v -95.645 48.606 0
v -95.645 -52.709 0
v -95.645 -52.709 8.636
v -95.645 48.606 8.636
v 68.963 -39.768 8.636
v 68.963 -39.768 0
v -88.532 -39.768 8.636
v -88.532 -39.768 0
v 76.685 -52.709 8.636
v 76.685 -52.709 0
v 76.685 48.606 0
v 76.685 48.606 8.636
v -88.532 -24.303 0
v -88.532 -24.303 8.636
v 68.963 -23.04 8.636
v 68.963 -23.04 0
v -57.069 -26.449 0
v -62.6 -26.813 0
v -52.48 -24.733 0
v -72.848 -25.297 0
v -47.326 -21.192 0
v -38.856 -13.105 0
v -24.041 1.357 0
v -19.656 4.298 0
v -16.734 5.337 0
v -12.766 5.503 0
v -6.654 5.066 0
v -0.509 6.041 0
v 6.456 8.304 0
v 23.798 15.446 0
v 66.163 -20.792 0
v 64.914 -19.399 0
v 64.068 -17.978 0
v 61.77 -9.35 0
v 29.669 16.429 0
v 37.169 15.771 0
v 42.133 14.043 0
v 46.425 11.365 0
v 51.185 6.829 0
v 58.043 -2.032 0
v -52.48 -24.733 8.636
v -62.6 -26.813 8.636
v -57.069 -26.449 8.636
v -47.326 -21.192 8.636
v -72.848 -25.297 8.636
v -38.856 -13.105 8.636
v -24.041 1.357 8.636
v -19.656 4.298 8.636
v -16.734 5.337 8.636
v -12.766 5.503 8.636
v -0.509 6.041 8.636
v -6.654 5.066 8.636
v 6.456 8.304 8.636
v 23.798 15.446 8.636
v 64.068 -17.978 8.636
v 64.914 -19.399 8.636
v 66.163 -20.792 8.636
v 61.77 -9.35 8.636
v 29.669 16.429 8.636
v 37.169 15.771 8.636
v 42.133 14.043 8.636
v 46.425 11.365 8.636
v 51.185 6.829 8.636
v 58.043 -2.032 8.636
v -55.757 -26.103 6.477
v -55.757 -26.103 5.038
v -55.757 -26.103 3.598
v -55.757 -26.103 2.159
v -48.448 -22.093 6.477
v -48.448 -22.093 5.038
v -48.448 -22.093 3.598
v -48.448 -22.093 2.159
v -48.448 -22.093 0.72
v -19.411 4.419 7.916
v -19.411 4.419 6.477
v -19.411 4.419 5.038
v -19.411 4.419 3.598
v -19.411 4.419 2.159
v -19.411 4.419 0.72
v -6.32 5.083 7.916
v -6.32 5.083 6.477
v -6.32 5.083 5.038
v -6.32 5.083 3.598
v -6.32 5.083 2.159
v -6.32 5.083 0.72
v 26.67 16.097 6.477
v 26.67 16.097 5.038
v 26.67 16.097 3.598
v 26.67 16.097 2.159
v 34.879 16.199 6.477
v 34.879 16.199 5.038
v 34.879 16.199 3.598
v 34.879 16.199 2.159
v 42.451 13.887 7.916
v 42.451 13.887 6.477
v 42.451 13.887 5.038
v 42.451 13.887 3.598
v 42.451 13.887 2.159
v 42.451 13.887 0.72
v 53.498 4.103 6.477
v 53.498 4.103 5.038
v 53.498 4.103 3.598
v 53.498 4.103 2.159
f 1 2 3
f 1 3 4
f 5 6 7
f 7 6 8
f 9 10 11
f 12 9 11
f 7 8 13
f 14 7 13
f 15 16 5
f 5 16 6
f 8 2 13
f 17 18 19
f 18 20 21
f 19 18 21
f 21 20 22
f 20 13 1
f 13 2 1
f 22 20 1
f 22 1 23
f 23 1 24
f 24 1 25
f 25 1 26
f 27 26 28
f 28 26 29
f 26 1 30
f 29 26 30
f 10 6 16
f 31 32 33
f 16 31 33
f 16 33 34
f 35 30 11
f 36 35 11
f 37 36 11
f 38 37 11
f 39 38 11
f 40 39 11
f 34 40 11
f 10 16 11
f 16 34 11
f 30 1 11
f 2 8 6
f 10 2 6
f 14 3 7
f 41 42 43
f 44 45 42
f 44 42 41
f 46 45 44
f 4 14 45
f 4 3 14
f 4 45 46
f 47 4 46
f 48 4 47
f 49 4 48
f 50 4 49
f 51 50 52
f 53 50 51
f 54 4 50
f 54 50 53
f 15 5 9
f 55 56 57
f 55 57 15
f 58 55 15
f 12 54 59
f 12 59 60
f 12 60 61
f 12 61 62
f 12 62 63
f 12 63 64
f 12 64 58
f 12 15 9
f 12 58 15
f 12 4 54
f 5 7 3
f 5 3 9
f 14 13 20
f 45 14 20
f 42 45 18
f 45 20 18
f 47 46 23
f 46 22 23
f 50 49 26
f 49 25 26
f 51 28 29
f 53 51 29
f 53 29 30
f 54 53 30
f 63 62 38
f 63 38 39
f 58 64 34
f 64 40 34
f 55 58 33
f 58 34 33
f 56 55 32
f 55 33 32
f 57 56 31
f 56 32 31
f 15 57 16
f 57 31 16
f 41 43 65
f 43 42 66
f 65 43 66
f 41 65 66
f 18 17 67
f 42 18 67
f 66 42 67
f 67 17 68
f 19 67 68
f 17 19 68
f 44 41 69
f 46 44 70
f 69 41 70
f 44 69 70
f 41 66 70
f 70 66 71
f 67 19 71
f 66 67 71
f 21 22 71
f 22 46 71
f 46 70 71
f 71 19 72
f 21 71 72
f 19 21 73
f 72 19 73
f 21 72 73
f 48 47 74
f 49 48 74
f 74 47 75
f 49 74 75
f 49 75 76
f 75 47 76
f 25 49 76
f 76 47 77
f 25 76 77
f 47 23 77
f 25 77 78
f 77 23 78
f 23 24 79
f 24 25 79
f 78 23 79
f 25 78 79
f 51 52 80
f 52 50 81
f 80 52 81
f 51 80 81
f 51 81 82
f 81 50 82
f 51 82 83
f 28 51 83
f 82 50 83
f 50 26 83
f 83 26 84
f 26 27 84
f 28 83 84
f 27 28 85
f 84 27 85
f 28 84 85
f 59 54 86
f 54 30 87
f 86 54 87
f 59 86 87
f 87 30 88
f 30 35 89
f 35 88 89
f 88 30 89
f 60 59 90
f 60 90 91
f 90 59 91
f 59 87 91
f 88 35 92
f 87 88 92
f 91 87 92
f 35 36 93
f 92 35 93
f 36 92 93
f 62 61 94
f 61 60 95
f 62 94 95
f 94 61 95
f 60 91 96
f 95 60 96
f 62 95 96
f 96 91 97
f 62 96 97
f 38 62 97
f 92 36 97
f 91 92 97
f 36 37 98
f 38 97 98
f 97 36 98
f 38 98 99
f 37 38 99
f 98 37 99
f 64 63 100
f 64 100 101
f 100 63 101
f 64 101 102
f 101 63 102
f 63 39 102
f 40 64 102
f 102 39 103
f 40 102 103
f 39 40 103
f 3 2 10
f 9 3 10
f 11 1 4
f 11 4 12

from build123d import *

# Parameters (mm, degrees)
F0_W     = 172.3292320967
F0_H     = 101.3144366443
F1_DEPTH = 8.636


with BuildPart() as f1:
    # F0 (on Top) → F1 (new body)
    with BuildSketch(Plane.XY):
        with Locations((-9.4799101353, -2.0515378565)):
            Rectangle(F0_W, F0_H)
        with BuildLine():
            Line((-88.5317772627, -39.7682860494), (-88.5317772627, -24.3028402328))
            add(Edge.make_bspline(
                [(-88.5317772627, -24.3028402328), (-84.1154674532, -24.3301939838), (-75.3150467023, -24.3847020523), (-61.8275793588, -27.7993877149), (-47.0761740058, -24.9491878227), (-20.8786523411, 9.1613433382), (-7.8521832723, 3.3505598391), (9.9191664694, 9.0354925092), (25.9001660214, 17.9384215056), (43.3933649001, 15.3632753855), (53.6525453865, 4.5014515518), (62.7657621664, -8.3734717511), (63.0711616447, -18.6906526874), (67.1167016184, -21.677176691), (68.9632594585, -23.0403542519)],
                knots=[0, 0, 0, 0, 0.0779449177, 0.1553215468, 0.2372775798, 0.3714428612, 0.4446131703, 0.5343926631, 0.6266231138, 0.7120333092, 0.7942253488, 0.8787074423, 0.9446368779, 1, 1, 1, 1], degree=3))
            Line((68.9632594585, -23.0403542519), (68.9632594585, -39.7682860494))
            Line((68.9632594585, -39.7682860494), (-88.5317772627, -39.7682860494))
        make_face(mode=Mode.SUBTRACT)
    extrude(amount=F1_DEPTH)


solid = f1.part
